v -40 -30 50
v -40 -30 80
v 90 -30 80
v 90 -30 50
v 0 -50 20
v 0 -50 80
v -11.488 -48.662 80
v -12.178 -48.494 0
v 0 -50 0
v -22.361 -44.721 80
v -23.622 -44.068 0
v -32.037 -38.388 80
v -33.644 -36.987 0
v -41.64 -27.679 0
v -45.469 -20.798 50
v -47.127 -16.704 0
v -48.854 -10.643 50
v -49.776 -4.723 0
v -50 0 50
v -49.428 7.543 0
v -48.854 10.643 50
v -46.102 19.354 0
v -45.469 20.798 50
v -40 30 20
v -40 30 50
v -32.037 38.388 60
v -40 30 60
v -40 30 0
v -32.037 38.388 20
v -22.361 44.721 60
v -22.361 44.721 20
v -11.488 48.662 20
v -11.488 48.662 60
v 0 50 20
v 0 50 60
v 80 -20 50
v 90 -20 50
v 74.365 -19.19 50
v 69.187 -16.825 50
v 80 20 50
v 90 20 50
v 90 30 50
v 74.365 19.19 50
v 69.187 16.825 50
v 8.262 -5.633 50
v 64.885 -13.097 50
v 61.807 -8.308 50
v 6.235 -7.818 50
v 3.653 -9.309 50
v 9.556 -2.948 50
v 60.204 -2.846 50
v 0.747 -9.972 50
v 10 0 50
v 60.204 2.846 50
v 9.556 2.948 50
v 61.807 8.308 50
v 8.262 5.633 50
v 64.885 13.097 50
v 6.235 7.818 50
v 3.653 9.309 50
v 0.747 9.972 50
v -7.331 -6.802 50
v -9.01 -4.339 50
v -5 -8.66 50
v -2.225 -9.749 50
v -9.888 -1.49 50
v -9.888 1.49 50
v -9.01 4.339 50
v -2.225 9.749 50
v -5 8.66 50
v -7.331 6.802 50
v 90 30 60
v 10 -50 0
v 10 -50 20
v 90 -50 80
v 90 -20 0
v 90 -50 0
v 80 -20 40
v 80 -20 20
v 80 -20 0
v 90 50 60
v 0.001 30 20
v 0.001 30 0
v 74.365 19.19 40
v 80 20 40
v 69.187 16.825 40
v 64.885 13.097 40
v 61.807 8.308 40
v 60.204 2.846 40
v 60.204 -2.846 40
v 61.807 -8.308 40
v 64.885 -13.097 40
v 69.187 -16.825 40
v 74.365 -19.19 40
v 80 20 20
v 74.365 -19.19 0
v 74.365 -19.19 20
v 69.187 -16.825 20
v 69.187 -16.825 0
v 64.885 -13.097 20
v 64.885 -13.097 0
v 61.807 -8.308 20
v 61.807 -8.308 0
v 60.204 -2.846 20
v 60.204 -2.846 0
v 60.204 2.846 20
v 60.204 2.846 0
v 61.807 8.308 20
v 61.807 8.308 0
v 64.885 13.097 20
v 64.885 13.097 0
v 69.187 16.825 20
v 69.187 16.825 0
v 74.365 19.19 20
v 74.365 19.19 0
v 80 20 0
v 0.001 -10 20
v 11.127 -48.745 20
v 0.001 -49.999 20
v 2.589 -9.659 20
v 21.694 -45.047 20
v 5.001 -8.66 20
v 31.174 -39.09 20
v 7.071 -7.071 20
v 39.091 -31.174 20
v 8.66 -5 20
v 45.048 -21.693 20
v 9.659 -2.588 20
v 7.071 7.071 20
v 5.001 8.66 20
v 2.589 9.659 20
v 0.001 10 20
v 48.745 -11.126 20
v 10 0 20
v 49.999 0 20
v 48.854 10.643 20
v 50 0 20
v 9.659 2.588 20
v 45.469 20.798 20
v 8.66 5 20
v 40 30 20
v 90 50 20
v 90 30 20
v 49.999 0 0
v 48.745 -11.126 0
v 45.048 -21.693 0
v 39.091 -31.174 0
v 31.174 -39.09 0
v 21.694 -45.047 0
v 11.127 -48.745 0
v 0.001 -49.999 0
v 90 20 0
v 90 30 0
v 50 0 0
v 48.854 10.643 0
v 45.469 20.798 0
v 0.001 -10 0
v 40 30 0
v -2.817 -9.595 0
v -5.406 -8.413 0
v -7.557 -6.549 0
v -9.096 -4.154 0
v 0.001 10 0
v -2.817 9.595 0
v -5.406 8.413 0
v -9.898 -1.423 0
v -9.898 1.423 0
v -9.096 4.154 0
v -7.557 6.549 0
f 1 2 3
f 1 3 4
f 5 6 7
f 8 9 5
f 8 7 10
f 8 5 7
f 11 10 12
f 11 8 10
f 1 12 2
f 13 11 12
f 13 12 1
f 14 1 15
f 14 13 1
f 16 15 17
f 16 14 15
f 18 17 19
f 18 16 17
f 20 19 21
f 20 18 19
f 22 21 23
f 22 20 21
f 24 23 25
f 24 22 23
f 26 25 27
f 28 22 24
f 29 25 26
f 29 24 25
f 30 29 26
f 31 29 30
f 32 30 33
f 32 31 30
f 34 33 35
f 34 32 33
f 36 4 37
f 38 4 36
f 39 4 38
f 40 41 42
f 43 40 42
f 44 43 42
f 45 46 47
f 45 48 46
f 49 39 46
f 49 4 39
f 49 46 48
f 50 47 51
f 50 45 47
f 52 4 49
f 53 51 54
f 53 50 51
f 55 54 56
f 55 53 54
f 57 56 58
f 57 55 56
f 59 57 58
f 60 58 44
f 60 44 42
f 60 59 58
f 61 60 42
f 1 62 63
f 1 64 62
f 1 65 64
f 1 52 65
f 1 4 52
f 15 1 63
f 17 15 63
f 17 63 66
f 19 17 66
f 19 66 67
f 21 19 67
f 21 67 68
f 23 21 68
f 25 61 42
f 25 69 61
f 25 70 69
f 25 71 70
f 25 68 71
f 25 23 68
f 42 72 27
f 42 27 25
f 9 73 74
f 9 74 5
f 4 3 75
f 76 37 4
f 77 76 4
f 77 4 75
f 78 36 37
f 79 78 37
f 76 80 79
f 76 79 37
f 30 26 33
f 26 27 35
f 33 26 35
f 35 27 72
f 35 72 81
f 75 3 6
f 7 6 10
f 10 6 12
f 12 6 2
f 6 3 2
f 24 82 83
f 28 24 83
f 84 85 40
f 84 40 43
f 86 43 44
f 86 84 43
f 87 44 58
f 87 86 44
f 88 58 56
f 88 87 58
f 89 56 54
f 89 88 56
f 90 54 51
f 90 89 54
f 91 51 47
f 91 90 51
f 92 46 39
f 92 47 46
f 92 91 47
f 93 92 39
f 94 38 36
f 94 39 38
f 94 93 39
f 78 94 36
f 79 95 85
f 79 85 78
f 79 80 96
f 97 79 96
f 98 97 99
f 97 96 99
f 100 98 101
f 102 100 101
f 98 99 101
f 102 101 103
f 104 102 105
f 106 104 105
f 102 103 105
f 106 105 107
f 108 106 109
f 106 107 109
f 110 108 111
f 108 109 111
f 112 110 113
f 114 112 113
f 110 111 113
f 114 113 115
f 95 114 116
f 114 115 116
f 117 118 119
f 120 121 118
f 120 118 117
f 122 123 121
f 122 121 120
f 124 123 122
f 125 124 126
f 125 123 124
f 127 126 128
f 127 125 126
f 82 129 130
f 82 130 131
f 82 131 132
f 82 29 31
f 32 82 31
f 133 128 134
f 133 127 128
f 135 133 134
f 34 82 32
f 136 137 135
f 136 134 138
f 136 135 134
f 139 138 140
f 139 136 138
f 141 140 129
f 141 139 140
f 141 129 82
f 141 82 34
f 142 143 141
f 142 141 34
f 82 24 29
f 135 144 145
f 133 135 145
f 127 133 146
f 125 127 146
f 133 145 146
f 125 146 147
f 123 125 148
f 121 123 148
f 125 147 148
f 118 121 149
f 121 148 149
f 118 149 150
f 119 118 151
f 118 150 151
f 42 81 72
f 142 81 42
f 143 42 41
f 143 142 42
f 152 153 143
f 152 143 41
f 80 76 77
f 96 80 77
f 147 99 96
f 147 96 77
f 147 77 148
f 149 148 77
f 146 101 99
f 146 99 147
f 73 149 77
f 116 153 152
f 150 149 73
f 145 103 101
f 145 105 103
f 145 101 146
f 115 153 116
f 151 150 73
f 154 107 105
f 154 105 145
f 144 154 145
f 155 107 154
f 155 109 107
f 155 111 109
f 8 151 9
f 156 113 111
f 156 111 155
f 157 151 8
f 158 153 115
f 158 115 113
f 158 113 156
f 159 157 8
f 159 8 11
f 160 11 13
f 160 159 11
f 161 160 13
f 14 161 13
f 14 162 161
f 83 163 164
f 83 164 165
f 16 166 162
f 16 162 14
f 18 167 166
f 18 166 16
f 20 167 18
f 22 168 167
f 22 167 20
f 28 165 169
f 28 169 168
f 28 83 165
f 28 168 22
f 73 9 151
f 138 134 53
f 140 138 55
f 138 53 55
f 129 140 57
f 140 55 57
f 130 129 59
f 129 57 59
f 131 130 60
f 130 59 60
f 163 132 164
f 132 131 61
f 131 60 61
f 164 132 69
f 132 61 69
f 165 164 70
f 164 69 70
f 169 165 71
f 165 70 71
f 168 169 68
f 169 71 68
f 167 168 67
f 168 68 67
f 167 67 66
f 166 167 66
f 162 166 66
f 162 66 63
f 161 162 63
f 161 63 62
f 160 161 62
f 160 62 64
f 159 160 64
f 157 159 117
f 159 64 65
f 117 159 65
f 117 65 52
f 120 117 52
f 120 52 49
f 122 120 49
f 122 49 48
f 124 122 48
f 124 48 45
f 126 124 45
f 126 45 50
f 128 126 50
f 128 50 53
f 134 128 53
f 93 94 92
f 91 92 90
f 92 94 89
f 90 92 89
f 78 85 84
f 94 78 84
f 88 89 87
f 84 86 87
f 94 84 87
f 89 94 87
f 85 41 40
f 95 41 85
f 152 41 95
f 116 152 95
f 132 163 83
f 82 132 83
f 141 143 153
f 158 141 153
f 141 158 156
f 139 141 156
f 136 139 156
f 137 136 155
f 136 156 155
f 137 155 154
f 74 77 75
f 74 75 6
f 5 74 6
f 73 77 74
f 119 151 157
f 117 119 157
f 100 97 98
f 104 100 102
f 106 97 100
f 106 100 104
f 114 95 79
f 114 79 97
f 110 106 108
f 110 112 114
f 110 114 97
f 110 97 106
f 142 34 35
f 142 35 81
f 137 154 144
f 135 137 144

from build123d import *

# Parameters (mm, degrees)
BOSS_EXTRUDE2_DEPTH = 80
SKETCH8_W           = 20
SKETCH8_H           = 20
CUT_EXTRUDE5_DEPTH  = 205
SKETCH9_W           = 30
SKETCH9_H           = 60
CUT_EXTRUDE6_DEPTH  = 205
SKETCH10_W          = 20
SKETCH10_H          = 20
CUT_EXTRUDE8_DEPTH  = 150
SKETCH13_R          = 10
CUT_EXTRUDE9_DEPTH  = 150
BOSS_EXTRUDE5_DEPTH = 40
CUT_EXTRUDE10_DEPTH = 20
CUT_EXTRUDE15_DEPTH = 20
SKETCH18_W          = 10
SKETCH18_H          = 20
CUT_EXTRUDE16_DEPTH = 0.0001


with BuildPart() as part:
    # Sketch1 → Boss-Extrude2 (new body)
    with BuildSketch(Plane.XY):
        with BuildLine():
            ThreePointArc((80, 20), (60, 0), (80, -20))
            Line((80, -20), (90, -20))
            Line((90, -20), (90, -50))
            Line((90, -50), (0, -50))
            ThreePointArc((0, -50), (-50, 0), (0, 50))
            Line((0, 50), (90, 50))
            Line((90, 50), (90, 20))
            Line((90, 20), (80, 20))
        make_face()
    extrude(amount=BOSS_EXTRUDE2_DEPTH)

    # Sketch8 → Cut-Extrude5 (cut)
    with BuildSketch(Plane(origin=(90, 0, 0), x_dir=(0, 0, -1), z_dir=(1, 0, 0))):
        with Locations((-10, 40)):
            Rectangle(SKETCH8_W, SKETCH8_H)
    extrude(amount=-CUT_EXTRUDE5_DEPTH, mode=Mode.SUBTRACT)

    # Sketch9 → Cut-Extrude6 (cut)
    with BuildSketch(Plane(origin=(-50, 0, 0), x_dir=(0, 0, -1), z_dir=(1, 0, 0))):
        with Locations((-65, 0)):
            Rectangle(SKETCH9_W, SKETCH9_H)
    extrude(amount=CUT_EXTRUDE6_DEPTH, mode=Mode.SUBTRACT)

    # Sketch10 → Cut-Extrude8 (cut)
    with BuildSketch(Plane(origin=(90, 0, 0), x_dir=(0, 0, -1), z_dir=(1, 0, 0))):
        with Locations((-70, 40)):
            Rectangle(SKETCH10_W, SKETCH10_H)
    extrude(amount=-CUT_EXTRUDE8_DEPTH, mode=Mode.SUBTRACT)

    # Sketch13 → Cut-Extrude9 (cut)
    with BuildSketch(Plane.XY.offset(50)):
        Circle(SKETCH13_R)
    extrude(amount=-CUT_EXTRUDE9_DEPTH, mode=Mode.SUBTRACT)

    # Sketch14 → Boss-Extrude5 (add)
    with BuildSketch(Plane(origin=(0, 0, 0), x_dir=(-1, 0, 0), z_dir=(0, 0, -1))):
        with BuildLine():
            Line((-80, 20), (-80, -20))
            ThreePointArc((-80, -20), (-60, 0), (-80, 20))
        make_face()
    extrude(amount=-BOSS_EXTRUDE5_DEPTH)

    # Sketch15 → Cut-Extrude10 (cut)
    with BuildSketch(Plane(origin=(0, 0, 0), x_dir=(-1, 0, 0), z_dir=(0, 0, -1))):
        with BuildLine():
            Line((-80, 20), (-80, -20))
            ThreePointArc((-80, -20), (-60, 0), (-80, 20))
        make_face()
    extrude(amount=-CUT_EXTRUDE10_DEPTH, mode=Mode.SUBTRACT)

    # Sketch16 → Cut-Extrude15 (cut)
    with BuildSketch(Plane(origin=(0, 0, 0), x_dir=(-1, 0, 0), z_dir=(0, 0, -1))):
        with BuildLine():
            Line((-10, 0), (-49.99900001, 0))
            ThreePointArc((-49.99900001, 0), (-35.354985511, -35.354278404), (-0.001, -49.999))
            Line((-0.001, -49.999), (-0.001, -9.99999995))
            ThreePointArc((-0.001, -9.99999995), (-7.071421356, -7.07071425), (-10, 0))
        make_face()
        with BuildLine():
            Line((-0.001, 30), (-40, 30))
            ThreePointArc((-40, 30), (-47.434164903, 15.811388301), (-50, 0))
            Line((-50, 0), (-49.99900001, 0))
            Line((-49.99900001, 0), (-10, 0))
            ThreePointArc((-10, 0), (-7.071421356, 7.07071425), (-0.001, 9.99999995))
            Line((-0.001, 10), (-0.001, 30))
        make_face()
    extrude(amount=-CUT_EXTRUDE15_DEPTH, mode=Mode.SUBTRACT)

    # Sketch18 → Cut-Extrude16 (cut)
    with BuildSketch(Plane(origin=(0, -50, 0), x_dir=(-1, 0, 0), z_dir=(0, -1, 0))):
        with Locations((-5, -10)):
            Rectangle(SKETCH18_W, SKETCH18_H)
    extrude(amount=-CUT_EXTRUDE16_DEPTH, mode=Mode.SUBTRACT)


solid = part.part
